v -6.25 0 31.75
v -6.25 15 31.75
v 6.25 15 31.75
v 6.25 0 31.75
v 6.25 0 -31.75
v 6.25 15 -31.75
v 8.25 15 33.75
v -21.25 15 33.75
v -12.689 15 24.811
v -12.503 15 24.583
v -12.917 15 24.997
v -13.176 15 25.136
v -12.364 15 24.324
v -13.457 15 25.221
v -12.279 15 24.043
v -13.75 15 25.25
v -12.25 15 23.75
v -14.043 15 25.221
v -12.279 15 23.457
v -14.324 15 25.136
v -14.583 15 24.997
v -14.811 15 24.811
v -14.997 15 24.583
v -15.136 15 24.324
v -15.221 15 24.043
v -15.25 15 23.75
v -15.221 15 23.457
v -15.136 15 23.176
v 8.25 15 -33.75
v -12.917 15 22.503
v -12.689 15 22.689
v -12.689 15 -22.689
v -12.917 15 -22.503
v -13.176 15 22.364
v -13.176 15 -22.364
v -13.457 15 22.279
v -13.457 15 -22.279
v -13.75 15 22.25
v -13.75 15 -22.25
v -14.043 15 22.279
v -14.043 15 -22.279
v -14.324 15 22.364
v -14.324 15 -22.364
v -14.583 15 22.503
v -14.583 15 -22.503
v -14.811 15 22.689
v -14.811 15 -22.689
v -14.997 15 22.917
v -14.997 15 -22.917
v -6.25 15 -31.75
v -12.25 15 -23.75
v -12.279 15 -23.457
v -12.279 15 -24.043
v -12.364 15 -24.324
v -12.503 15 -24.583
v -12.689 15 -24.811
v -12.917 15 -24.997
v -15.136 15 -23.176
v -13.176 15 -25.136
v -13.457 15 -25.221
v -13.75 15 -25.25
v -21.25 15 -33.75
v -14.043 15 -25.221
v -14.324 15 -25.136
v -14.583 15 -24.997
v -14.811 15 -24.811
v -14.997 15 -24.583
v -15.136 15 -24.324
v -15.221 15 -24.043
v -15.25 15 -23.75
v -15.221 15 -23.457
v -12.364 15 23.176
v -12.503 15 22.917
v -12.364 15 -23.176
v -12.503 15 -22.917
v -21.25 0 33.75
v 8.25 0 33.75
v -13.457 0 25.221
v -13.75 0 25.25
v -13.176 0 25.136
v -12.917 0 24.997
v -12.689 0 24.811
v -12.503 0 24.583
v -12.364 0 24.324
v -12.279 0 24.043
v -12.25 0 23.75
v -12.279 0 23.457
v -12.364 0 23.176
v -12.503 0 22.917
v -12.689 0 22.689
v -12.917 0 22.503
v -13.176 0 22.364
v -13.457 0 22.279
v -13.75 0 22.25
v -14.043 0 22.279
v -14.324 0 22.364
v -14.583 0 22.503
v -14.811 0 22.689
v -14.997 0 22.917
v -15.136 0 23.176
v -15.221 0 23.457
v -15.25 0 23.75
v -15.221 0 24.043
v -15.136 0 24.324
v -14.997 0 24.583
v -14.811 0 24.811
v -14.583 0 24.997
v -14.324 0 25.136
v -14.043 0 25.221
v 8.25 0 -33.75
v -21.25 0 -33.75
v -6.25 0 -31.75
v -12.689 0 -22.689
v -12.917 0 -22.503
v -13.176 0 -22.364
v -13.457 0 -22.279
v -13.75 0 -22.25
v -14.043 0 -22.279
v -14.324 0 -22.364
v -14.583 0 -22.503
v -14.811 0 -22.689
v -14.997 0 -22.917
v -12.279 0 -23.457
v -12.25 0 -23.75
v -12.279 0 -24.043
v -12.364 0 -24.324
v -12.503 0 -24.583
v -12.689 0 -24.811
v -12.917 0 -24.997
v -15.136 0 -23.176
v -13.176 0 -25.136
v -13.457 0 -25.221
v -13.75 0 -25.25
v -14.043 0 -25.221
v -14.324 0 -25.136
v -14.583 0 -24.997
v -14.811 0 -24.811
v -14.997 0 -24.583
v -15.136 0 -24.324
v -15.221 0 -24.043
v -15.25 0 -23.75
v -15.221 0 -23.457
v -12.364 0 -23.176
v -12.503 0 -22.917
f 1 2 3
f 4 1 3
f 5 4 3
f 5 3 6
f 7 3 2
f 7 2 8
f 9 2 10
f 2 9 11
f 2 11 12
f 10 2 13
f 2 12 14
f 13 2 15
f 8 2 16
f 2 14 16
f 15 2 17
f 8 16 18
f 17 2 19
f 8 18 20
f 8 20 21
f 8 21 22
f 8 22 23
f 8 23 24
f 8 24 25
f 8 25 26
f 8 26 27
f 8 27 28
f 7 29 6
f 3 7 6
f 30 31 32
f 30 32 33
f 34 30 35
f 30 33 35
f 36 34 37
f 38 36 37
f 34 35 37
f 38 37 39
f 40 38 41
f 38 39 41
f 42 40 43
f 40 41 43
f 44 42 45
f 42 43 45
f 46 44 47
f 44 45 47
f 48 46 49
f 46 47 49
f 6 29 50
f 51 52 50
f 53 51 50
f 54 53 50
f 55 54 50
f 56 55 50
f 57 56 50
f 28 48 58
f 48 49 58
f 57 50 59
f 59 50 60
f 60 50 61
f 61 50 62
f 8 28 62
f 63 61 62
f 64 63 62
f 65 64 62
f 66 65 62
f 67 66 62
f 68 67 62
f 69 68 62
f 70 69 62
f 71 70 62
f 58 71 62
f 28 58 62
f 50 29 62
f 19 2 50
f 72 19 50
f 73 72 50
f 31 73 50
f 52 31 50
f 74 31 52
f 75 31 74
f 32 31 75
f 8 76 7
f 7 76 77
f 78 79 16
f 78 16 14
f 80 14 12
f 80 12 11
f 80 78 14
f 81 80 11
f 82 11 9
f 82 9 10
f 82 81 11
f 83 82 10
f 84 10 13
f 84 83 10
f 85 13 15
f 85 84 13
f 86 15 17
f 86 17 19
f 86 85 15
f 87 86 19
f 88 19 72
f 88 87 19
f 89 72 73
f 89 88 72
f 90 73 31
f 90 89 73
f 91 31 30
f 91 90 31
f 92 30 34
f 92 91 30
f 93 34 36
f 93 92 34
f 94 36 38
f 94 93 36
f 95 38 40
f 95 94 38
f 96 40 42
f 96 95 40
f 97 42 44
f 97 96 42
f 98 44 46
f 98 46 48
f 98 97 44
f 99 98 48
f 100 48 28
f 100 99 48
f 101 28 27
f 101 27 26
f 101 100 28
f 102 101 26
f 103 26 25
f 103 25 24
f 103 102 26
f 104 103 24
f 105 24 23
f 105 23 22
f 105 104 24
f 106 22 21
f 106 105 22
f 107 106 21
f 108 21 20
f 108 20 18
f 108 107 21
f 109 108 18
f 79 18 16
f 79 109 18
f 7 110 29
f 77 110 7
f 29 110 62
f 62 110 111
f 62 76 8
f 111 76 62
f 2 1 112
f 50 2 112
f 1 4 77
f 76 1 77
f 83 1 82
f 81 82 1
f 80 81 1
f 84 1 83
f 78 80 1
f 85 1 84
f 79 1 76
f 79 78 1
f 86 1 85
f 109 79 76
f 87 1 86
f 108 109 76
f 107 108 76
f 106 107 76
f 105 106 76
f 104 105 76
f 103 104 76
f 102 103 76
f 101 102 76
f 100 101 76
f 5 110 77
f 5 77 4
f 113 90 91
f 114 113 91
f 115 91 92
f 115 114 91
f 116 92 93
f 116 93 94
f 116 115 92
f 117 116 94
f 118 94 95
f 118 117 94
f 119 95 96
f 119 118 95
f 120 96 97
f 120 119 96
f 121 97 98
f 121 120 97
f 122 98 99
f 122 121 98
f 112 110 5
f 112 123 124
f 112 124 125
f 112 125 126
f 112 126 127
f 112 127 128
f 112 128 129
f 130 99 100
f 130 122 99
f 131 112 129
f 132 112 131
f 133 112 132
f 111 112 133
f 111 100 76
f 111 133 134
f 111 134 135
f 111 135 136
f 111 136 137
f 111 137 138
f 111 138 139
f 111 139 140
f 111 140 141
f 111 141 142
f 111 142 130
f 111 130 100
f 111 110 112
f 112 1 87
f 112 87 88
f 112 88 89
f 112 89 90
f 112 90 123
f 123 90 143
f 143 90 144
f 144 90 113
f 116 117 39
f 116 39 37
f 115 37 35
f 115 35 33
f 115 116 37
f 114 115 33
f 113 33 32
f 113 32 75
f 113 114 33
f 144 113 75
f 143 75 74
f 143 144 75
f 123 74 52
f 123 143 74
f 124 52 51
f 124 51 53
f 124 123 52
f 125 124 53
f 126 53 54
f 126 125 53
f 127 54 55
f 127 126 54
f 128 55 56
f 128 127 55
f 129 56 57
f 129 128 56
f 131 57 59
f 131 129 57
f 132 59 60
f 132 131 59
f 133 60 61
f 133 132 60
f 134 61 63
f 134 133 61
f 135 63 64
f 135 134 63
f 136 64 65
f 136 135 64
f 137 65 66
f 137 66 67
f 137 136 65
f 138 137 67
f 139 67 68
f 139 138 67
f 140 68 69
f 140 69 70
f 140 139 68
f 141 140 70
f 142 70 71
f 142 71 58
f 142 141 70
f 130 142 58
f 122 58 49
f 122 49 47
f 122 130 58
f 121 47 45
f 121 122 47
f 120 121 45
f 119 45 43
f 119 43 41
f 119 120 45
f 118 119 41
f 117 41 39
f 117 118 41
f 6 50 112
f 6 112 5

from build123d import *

# Parameters (mm, degrees)
CROQUIS1_R              = 1.5
CROQUIS1_W              = 12.5
CROQUIS1_H              = 63.5
SALIENTE_EXTRUIR1_DEPTH = 15


with BuildPart() as part:
    # Croquis1 → Saliente-Extruir1 (new body)
    with BuildSketch(Plane(origin=(0, 0, 0), x_dir=(1, 0, 0), z_dir=(0, 1, 0))):
        Polygon((-8.25, 33.75), (8.25, 33.75), (8.25, -33.75), (-8.25, -33.75), (-21.25, -33.75), (-21.25, 33.75), align=None)
        with Locations(Location((-13.75, -23.75, 0), (0, 0, 270))):
            Circle(CROQUIS1_R, mode=Mode.SUBTRACT)
        with Locations(Location((-13.75, 23.75, 0), (0, 0, 270))):
            Circle(CROQUIS1_R, mode=Mode.SUBTRACT)
        Rectangle(CROQUIS1_W, CROQUIS1_H, mode=Mode.SUBTRACT)
    extrude(amount=SALIENTE_EXTRUIR1_DEPTH)


solid = part.part
